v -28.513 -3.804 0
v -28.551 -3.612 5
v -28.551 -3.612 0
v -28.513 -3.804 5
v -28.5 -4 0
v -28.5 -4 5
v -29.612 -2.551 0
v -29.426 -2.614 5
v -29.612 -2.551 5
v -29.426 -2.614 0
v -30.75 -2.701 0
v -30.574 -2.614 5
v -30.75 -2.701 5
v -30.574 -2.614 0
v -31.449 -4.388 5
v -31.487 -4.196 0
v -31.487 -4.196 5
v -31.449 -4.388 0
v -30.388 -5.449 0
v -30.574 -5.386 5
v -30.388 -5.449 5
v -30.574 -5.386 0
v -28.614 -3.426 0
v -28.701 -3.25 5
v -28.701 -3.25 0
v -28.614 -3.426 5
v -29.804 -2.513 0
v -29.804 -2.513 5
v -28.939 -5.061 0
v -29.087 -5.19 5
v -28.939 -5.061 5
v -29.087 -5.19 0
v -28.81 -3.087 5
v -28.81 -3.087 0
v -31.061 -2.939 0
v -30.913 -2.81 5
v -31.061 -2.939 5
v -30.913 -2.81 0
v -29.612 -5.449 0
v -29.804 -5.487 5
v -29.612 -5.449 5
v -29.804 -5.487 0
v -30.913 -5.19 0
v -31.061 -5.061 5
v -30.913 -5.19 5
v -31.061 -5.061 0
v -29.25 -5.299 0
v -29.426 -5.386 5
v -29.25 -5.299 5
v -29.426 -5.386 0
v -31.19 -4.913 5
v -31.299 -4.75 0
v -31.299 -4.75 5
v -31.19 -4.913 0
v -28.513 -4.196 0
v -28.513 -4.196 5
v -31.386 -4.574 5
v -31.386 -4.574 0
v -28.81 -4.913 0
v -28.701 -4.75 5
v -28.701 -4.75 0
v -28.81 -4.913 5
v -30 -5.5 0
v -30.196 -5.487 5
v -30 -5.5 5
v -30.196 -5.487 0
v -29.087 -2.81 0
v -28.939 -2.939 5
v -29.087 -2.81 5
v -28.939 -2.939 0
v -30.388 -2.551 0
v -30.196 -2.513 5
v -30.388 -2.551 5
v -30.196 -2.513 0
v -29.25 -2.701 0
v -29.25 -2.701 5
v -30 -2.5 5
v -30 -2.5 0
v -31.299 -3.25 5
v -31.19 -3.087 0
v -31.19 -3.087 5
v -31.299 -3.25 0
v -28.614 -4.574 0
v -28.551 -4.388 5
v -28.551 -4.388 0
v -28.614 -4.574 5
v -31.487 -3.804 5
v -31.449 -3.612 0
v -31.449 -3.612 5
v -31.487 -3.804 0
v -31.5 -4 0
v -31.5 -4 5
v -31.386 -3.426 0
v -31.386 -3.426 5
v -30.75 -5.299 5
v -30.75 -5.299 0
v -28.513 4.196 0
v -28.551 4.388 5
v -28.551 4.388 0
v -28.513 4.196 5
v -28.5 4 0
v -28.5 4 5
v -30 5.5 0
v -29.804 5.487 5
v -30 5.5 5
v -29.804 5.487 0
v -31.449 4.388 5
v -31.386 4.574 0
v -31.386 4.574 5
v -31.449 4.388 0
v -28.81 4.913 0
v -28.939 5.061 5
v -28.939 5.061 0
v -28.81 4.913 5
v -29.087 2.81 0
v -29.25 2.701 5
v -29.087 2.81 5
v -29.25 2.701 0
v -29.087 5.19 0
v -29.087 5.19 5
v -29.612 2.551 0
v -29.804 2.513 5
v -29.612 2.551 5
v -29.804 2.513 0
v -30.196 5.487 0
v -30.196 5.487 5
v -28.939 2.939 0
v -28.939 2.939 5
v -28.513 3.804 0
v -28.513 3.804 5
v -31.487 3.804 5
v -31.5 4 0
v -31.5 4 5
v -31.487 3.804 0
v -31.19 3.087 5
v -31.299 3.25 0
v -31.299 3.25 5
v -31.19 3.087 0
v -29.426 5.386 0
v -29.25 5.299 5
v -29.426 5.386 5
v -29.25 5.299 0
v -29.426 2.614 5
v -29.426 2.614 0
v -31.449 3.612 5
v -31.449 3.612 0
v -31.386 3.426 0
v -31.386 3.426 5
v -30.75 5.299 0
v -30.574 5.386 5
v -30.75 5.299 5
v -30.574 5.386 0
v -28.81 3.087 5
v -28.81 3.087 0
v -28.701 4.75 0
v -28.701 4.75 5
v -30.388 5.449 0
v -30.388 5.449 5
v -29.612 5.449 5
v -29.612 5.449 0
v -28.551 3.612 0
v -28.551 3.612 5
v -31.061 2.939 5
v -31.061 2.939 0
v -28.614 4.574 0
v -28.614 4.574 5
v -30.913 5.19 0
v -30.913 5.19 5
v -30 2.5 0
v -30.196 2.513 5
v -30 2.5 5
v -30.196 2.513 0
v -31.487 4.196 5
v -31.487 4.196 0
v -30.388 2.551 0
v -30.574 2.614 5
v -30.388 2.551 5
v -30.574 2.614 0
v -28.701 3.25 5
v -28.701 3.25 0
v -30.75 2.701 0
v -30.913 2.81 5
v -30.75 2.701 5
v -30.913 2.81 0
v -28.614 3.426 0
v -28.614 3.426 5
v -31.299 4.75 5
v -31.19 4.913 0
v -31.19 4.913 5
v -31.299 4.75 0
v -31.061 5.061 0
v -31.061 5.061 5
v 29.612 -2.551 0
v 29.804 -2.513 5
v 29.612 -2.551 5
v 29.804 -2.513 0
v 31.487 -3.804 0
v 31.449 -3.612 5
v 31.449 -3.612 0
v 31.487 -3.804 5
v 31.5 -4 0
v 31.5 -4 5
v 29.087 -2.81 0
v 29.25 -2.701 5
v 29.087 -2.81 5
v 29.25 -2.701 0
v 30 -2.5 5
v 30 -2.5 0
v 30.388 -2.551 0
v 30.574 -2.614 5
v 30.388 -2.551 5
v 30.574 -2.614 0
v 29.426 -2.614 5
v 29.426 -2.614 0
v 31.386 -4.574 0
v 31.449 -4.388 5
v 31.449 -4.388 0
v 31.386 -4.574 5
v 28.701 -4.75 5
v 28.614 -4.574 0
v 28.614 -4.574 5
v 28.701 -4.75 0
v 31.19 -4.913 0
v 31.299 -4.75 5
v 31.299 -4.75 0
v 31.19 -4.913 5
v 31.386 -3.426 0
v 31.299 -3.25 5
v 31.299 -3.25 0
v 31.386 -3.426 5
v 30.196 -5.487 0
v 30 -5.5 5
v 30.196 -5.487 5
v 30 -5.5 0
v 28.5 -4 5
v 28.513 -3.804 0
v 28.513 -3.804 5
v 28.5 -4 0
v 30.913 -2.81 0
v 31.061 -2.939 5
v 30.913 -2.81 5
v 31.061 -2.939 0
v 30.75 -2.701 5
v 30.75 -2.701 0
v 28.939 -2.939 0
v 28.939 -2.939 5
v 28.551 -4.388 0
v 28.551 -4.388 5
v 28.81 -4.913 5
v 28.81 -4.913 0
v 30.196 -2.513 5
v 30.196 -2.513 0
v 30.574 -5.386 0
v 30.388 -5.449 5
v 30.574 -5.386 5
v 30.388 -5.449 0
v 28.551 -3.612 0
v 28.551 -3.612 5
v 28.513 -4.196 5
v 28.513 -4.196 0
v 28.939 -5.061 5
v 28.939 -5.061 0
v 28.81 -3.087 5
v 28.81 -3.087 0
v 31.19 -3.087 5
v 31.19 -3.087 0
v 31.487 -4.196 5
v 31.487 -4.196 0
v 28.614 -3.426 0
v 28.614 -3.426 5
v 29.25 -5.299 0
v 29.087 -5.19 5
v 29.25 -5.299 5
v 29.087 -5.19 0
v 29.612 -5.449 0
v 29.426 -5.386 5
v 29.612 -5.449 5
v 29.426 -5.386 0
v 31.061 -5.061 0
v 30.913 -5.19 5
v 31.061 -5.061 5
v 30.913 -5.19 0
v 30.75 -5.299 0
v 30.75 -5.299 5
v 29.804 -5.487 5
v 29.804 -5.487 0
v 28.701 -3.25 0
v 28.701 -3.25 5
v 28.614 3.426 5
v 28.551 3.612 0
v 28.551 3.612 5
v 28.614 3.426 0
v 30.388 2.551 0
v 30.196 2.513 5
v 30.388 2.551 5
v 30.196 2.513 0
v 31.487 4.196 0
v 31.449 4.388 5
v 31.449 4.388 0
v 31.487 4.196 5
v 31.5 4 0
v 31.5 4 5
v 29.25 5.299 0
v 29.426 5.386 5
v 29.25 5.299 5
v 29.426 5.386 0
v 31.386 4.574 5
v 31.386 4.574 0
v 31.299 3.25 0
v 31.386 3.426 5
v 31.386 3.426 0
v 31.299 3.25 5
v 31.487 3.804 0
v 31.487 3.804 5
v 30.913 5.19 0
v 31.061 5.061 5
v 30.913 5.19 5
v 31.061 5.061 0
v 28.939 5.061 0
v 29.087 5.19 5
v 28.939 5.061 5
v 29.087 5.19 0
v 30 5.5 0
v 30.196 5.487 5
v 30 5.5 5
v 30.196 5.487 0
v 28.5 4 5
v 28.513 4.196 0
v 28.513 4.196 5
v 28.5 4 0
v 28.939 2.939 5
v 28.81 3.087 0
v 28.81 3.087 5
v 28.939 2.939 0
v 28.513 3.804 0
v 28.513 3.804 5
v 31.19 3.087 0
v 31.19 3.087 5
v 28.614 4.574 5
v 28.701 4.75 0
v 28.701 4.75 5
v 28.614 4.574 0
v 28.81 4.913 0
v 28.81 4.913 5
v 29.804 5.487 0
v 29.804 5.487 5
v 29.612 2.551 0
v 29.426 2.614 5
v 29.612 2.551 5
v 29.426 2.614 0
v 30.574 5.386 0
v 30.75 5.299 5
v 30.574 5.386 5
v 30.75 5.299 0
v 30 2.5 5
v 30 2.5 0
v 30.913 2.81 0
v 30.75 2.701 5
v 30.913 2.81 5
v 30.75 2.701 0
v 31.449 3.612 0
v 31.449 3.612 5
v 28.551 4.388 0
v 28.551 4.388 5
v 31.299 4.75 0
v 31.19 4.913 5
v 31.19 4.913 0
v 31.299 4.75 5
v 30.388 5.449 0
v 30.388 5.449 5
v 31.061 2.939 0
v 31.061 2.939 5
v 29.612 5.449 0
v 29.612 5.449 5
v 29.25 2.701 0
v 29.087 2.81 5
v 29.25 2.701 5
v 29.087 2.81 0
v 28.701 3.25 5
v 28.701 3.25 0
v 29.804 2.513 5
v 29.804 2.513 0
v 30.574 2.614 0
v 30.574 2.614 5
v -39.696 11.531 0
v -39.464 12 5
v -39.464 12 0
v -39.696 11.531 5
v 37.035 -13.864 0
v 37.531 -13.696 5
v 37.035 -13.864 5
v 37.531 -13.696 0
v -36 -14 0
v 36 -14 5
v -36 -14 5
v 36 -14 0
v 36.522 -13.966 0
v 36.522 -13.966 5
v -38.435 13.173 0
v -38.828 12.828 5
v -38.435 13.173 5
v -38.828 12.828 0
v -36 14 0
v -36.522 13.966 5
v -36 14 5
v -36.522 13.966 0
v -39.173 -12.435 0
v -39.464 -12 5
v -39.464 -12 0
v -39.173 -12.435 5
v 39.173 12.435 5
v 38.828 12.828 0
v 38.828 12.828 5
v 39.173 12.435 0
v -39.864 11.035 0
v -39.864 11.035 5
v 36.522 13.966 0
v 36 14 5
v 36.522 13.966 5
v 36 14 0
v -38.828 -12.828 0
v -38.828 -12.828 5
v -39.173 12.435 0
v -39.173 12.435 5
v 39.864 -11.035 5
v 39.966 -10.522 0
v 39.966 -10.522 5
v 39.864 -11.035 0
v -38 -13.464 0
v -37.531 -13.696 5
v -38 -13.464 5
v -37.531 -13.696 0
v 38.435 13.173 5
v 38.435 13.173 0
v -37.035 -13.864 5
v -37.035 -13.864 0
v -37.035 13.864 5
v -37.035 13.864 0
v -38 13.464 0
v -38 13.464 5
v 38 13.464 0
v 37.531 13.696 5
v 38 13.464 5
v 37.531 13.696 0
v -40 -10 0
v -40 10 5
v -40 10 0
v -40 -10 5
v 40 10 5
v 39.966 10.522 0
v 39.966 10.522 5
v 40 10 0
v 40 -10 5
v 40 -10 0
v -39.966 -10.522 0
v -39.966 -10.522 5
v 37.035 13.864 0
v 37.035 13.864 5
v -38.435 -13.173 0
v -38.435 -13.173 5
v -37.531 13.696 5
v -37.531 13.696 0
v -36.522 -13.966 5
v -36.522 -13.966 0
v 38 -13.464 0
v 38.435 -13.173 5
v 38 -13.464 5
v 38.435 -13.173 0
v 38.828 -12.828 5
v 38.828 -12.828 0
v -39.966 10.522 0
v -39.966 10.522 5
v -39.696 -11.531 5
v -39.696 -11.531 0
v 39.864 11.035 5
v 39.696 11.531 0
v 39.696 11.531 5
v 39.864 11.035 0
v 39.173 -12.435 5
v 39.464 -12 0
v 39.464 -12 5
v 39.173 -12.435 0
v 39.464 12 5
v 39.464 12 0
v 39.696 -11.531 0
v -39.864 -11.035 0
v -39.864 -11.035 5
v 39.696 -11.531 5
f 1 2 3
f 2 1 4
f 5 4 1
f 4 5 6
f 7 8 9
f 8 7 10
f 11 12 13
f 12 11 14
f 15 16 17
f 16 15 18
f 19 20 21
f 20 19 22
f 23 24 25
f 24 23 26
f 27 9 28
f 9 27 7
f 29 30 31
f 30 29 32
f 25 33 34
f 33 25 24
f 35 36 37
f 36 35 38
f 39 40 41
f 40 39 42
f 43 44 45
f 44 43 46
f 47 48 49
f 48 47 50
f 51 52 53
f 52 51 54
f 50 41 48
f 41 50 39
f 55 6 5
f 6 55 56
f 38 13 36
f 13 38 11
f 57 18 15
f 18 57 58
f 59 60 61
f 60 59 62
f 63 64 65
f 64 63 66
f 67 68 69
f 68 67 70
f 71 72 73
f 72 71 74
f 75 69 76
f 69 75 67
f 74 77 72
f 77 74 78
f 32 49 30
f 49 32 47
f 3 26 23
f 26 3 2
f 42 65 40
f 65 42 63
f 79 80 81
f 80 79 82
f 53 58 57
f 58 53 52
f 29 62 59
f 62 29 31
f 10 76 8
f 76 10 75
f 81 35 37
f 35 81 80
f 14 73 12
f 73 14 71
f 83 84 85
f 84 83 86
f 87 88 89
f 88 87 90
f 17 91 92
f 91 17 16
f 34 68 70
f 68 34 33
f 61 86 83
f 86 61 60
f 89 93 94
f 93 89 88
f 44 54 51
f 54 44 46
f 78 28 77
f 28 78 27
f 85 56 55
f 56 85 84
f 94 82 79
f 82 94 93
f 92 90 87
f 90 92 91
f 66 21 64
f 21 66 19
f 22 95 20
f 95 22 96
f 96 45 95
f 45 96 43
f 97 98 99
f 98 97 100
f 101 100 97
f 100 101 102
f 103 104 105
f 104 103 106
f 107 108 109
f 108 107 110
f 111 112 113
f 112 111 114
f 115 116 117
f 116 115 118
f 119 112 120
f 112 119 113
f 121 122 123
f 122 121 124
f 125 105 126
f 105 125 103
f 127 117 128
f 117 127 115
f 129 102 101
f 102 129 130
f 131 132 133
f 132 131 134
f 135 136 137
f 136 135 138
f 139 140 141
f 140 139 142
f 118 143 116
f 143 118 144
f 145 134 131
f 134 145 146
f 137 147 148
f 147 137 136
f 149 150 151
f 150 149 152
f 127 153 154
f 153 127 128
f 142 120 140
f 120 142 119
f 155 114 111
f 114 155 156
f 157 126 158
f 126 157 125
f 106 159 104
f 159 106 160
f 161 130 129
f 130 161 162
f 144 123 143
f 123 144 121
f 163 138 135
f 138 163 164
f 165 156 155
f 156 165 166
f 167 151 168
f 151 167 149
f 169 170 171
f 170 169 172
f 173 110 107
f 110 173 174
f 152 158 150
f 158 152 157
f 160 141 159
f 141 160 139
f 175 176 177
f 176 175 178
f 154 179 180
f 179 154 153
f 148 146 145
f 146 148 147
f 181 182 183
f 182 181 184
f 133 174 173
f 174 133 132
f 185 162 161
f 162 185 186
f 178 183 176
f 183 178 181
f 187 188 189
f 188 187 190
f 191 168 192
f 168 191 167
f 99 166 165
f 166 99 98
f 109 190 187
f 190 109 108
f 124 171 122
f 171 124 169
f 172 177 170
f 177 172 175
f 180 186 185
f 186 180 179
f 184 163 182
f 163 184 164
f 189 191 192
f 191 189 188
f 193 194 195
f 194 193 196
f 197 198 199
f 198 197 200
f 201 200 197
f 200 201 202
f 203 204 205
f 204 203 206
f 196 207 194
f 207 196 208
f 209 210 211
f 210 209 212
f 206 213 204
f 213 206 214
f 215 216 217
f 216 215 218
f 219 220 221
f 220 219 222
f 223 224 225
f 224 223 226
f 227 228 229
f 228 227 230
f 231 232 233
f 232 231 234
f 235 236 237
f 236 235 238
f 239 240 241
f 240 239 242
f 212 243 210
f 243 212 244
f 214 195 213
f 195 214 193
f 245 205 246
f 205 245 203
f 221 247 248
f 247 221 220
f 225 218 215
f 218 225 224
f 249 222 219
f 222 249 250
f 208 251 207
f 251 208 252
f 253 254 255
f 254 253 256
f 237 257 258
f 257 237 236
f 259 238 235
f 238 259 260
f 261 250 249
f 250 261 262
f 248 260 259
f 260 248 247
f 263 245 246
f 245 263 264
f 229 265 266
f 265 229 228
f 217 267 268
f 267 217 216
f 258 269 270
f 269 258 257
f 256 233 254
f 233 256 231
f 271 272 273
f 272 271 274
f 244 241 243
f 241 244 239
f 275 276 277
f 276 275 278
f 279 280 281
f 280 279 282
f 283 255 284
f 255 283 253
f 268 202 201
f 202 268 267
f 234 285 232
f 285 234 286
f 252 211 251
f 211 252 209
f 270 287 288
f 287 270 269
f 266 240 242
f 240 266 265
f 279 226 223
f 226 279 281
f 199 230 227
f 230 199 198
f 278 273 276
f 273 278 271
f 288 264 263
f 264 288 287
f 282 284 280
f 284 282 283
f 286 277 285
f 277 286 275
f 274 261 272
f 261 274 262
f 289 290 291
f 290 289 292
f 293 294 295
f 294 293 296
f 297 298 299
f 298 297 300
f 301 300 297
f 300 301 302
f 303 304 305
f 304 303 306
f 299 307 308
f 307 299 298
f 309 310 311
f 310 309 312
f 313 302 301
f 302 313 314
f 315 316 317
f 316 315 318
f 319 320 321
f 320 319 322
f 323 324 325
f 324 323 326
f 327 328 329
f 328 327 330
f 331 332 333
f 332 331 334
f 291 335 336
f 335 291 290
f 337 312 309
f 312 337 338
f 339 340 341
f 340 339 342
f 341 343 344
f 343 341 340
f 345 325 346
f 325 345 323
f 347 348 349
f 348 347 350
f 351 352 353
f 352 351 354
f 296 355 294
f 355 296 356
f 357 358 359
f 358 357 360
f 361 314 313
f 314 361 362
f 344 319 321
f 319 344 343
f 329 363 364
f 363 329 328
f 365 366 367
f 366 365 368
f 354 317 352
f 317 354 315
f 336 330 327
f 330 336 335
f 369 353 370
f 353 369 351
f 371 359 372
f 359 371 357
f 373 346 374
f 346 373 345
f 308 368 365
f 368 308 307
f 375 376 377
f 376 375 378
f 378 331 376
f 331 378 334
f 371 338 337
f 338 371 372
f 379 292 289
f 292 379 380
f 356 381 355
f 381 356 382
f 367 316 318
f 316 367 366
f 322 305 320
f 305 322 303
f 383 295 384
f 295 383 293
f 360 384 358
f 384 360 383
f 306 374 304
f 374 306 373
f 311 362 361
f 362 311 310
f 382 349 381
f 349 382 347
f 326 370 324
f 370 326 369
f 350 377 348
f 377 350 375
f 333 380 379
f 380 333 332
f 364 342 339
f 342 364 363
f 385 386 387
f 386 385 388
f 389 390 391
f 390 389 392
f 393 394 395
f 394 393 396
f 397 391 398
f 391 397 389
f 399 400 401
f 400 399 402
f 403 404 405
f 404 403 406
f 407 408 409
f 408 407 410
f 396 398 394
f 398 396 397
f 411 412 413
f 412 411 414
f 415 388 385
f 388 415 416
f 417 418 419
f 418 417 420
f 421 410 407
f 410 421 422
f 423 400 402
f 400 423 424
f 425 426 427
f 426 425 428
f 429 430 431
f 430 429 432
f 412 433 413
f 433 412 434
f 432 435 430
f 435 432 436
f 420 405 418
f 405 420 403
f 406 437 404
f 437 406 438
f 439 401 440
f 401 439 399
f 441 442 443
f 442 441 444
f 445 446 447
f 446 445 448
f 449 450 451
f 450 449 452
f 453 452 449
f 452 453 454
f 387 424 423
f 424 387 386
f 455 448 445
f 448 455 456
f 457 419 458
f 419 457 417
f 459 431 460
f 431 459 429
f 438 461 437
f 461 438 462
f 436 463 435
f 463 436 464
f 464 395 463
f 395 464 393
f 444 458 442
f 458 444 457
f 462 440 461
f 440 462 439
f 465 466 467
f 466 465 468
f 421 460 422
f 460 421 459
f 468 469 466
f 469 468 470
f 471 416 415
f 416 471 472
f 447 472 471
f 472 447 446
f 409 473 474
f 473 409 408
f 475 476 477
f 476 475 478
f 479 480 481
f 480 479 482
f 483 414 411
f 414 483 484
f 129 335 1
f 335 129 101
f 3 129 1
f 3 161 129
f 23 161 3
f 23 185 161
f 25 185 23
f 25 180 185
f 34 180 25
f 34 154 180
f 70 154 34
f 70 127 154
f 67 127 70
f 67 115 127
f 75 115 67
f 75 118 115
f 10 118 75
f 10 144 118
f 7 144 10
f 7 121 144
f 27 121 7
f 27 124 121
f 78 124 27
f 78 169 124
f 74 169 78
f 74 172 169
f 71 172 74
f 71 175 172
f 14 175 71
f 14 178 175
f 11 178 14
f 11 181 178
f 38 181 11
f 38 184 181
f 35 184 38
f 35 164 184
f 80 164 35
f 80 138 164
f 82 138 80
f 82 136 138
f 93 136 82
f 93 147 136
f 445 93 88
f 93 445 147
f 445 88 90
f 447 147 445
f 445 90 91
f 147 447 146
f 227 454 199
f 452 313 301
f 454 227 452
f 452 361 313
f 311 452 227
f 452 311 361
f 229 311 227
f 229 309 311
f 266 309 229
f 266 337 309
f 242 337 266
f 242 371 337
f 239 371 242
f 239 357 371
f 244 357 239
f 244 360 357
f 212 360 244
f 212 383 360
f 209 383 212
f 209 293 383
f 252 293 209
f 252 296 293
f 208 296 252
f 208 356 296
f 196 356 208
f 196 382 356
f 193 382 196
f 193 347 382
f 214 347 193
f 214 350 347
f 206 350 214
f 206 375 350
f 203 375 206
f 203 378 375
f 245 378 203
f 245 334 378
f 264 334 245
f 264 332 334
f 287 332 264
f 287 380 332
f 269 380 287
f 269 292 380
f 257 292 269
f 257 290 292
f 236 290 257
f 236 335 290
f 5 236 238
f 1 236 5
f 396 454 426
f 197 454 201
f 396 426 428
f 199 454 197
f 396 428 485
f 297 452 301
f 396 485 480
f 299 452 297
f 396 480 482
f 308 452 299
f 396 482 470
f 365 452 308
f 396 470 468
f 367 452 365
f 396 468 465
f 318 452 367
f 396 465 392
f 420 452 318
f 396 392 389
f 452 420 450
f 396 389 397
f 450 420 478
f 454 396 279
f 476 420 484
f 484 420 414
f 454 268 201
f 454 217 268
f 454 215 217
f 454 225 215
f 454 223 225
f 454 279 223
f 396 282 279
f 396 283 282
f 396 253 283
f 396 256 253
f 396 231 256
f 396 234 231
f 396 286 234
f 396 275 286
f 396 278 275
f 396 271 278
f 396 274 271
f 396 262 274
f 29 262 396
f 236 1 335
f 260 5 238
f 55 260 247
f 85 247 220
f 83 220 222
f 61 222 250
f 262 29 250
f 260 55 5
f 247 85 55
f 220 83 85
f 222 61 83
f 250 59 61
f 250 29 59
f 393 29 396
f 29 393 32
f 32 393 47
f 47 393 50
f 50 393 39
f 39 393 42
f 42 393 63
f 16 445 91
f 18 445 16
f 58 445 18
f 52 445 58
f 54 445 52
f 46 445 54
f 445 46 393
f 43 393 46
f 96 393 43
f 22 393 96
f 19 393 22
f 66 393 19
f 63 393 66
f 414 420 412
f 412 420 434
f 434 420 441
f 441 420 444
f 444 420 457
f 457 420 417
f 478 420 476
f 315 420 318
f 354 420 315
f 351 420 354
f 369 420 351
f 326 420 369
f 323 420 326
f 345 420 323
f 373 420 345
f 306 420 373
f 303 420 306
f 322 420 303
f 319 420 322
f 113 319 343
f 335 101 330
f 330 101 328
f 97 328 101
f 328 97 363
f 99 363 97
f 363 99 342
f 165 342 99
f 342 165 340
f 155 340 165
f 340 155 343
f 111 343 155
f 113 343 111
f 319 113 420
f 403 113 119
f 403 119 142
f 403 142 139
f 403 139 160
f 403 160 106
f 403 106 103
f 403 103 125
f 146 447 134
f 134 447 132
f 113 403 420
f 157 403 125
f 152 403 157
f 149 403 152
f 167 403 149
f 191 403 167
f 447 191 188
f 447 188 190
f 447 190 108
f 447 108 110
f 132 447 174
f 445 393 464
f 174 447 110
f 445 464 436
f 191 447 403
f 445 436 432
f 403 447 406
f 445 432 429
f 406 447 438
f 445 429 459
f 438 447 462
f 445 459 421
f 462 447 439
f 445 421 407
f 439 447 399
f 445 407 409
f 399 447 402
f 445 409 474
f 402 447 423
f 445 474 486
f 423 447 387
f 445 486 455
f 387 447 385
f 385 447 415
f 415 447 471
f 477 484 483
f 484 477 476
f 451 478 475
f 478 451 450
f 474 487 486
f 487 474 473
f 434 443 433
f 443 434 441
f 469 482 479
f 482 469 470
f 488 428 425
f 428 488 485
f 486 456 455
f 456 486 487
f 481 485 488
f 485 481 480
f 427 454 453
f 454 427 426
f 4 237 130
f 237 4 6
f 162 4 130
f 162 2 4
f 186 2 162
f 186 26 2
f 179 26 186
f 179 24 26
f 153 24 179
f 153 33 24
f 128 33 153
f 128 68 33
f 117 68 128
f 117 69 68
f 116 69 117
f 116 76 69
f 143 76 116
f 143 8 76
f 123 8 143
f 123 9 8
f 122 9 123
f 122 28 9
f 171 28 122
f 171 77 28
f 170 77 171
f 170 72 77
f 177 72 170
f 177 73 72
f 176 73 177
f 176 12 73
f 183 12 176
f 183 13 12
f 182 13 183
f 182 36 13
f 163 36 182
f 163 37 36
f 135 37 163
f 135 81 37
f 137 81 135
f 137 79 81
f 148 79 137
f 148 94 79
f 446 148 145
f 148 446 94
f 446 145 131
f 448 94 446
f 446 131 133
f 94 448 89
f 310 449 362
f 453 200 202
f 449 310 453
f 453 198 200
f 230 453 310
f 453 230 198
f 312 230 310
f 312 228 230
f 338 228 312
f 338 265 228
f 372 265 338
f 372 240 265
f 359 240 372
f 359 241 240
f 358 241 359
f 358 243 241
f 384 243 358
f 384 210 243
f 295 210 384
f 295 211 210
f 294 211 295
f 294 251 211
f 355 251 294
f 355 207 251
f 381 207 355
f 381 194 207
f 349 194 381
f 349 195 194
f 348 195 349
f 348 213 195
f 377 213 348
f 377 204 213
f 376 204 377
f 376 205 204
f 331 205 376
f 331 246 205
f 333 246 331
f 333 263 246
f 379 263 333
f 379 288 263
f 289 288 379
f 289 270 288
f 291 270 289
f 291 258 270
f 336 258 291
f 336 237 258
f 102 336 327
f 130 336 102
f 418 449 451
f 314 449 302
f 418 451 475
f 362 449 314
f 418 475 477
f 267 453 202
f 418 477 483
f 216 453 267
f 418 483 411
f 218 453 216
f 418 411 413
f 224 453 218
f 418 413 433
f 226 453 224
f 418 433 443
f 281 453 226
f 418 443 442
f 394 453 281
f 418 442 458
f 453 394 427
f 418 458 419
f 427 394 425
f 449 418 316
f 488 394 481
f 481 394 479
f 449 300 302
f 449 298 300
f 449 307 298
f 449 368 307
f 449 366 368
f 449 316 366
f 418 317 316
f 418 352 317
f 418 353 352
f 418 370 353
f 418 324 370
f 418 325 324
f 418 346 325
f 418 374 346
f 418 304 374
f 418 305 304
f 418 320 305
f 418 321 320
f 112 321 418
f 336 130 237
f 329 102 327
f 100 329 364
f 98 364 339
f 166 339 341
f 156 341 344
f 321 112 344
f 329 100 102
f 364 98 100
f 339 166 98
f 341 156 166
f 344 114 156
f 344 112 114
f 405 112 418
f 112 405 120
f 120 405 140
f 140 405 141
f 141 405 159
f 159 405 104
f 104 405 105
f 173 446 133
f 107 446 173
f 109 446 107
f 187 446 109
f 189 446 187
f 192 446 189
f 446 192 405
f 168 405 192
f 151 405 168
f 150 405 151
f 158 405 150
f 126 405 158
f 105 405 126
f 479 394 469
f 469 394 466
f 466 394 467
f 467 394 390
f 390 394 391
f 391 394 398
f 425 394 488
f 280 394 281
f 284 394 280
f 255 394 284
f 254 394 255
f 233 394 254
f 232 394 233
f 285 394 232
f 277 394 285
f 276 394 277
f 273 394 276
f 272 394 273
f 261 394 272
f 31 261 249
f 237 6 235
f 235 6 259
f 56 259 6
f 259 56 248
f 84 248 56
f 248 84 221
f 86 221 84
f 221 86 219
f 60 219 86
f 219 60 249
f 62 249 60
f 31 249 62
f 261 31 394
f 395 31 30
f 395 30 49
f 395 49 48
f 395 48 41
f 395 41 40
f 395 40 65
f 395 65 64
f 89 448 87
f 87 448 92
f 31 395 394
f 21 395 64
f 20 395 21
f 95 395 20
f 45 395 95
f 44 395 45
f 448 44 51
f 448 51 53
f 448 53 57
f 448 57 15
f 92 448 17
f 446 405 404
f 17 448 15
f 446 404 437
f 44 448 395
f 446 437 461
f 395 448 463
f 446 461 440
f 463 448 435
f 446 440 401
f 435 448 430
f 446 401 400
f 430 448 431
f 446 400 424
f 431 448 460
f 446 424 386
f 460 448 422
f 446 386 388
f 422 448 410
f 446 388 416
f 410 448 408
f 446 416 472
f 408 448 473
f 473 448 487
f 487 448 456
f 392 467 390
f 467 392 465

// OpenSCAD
// Starter rounded nameplate for task-010.
$fn = 48;

plate_width = 80;
plate_height = 28;
corner_radius = 4;
plate_thickness = 5;
hole_diameter = 3;
hole_edge_offset = 10;

difference() {
  linear_extrude(height = plate_thickness)
    offset(r = corner_radius)
      square([plate_width - 2 * corner_radius, plate_height - 2 * corner_radius], center = true);

  for (x = [-plate_width / 2 + hole_edge_offset, plate_width / 2 - hole_edge_offset])
    for (y = [-plate_height / 2 + hole_edge_offset, plate_height / 2 - hole_edge_offset])
      translate([x, y, -1])
        cylinder(h = plate_thickness + 2, r = hole_diameter / 2);
}
